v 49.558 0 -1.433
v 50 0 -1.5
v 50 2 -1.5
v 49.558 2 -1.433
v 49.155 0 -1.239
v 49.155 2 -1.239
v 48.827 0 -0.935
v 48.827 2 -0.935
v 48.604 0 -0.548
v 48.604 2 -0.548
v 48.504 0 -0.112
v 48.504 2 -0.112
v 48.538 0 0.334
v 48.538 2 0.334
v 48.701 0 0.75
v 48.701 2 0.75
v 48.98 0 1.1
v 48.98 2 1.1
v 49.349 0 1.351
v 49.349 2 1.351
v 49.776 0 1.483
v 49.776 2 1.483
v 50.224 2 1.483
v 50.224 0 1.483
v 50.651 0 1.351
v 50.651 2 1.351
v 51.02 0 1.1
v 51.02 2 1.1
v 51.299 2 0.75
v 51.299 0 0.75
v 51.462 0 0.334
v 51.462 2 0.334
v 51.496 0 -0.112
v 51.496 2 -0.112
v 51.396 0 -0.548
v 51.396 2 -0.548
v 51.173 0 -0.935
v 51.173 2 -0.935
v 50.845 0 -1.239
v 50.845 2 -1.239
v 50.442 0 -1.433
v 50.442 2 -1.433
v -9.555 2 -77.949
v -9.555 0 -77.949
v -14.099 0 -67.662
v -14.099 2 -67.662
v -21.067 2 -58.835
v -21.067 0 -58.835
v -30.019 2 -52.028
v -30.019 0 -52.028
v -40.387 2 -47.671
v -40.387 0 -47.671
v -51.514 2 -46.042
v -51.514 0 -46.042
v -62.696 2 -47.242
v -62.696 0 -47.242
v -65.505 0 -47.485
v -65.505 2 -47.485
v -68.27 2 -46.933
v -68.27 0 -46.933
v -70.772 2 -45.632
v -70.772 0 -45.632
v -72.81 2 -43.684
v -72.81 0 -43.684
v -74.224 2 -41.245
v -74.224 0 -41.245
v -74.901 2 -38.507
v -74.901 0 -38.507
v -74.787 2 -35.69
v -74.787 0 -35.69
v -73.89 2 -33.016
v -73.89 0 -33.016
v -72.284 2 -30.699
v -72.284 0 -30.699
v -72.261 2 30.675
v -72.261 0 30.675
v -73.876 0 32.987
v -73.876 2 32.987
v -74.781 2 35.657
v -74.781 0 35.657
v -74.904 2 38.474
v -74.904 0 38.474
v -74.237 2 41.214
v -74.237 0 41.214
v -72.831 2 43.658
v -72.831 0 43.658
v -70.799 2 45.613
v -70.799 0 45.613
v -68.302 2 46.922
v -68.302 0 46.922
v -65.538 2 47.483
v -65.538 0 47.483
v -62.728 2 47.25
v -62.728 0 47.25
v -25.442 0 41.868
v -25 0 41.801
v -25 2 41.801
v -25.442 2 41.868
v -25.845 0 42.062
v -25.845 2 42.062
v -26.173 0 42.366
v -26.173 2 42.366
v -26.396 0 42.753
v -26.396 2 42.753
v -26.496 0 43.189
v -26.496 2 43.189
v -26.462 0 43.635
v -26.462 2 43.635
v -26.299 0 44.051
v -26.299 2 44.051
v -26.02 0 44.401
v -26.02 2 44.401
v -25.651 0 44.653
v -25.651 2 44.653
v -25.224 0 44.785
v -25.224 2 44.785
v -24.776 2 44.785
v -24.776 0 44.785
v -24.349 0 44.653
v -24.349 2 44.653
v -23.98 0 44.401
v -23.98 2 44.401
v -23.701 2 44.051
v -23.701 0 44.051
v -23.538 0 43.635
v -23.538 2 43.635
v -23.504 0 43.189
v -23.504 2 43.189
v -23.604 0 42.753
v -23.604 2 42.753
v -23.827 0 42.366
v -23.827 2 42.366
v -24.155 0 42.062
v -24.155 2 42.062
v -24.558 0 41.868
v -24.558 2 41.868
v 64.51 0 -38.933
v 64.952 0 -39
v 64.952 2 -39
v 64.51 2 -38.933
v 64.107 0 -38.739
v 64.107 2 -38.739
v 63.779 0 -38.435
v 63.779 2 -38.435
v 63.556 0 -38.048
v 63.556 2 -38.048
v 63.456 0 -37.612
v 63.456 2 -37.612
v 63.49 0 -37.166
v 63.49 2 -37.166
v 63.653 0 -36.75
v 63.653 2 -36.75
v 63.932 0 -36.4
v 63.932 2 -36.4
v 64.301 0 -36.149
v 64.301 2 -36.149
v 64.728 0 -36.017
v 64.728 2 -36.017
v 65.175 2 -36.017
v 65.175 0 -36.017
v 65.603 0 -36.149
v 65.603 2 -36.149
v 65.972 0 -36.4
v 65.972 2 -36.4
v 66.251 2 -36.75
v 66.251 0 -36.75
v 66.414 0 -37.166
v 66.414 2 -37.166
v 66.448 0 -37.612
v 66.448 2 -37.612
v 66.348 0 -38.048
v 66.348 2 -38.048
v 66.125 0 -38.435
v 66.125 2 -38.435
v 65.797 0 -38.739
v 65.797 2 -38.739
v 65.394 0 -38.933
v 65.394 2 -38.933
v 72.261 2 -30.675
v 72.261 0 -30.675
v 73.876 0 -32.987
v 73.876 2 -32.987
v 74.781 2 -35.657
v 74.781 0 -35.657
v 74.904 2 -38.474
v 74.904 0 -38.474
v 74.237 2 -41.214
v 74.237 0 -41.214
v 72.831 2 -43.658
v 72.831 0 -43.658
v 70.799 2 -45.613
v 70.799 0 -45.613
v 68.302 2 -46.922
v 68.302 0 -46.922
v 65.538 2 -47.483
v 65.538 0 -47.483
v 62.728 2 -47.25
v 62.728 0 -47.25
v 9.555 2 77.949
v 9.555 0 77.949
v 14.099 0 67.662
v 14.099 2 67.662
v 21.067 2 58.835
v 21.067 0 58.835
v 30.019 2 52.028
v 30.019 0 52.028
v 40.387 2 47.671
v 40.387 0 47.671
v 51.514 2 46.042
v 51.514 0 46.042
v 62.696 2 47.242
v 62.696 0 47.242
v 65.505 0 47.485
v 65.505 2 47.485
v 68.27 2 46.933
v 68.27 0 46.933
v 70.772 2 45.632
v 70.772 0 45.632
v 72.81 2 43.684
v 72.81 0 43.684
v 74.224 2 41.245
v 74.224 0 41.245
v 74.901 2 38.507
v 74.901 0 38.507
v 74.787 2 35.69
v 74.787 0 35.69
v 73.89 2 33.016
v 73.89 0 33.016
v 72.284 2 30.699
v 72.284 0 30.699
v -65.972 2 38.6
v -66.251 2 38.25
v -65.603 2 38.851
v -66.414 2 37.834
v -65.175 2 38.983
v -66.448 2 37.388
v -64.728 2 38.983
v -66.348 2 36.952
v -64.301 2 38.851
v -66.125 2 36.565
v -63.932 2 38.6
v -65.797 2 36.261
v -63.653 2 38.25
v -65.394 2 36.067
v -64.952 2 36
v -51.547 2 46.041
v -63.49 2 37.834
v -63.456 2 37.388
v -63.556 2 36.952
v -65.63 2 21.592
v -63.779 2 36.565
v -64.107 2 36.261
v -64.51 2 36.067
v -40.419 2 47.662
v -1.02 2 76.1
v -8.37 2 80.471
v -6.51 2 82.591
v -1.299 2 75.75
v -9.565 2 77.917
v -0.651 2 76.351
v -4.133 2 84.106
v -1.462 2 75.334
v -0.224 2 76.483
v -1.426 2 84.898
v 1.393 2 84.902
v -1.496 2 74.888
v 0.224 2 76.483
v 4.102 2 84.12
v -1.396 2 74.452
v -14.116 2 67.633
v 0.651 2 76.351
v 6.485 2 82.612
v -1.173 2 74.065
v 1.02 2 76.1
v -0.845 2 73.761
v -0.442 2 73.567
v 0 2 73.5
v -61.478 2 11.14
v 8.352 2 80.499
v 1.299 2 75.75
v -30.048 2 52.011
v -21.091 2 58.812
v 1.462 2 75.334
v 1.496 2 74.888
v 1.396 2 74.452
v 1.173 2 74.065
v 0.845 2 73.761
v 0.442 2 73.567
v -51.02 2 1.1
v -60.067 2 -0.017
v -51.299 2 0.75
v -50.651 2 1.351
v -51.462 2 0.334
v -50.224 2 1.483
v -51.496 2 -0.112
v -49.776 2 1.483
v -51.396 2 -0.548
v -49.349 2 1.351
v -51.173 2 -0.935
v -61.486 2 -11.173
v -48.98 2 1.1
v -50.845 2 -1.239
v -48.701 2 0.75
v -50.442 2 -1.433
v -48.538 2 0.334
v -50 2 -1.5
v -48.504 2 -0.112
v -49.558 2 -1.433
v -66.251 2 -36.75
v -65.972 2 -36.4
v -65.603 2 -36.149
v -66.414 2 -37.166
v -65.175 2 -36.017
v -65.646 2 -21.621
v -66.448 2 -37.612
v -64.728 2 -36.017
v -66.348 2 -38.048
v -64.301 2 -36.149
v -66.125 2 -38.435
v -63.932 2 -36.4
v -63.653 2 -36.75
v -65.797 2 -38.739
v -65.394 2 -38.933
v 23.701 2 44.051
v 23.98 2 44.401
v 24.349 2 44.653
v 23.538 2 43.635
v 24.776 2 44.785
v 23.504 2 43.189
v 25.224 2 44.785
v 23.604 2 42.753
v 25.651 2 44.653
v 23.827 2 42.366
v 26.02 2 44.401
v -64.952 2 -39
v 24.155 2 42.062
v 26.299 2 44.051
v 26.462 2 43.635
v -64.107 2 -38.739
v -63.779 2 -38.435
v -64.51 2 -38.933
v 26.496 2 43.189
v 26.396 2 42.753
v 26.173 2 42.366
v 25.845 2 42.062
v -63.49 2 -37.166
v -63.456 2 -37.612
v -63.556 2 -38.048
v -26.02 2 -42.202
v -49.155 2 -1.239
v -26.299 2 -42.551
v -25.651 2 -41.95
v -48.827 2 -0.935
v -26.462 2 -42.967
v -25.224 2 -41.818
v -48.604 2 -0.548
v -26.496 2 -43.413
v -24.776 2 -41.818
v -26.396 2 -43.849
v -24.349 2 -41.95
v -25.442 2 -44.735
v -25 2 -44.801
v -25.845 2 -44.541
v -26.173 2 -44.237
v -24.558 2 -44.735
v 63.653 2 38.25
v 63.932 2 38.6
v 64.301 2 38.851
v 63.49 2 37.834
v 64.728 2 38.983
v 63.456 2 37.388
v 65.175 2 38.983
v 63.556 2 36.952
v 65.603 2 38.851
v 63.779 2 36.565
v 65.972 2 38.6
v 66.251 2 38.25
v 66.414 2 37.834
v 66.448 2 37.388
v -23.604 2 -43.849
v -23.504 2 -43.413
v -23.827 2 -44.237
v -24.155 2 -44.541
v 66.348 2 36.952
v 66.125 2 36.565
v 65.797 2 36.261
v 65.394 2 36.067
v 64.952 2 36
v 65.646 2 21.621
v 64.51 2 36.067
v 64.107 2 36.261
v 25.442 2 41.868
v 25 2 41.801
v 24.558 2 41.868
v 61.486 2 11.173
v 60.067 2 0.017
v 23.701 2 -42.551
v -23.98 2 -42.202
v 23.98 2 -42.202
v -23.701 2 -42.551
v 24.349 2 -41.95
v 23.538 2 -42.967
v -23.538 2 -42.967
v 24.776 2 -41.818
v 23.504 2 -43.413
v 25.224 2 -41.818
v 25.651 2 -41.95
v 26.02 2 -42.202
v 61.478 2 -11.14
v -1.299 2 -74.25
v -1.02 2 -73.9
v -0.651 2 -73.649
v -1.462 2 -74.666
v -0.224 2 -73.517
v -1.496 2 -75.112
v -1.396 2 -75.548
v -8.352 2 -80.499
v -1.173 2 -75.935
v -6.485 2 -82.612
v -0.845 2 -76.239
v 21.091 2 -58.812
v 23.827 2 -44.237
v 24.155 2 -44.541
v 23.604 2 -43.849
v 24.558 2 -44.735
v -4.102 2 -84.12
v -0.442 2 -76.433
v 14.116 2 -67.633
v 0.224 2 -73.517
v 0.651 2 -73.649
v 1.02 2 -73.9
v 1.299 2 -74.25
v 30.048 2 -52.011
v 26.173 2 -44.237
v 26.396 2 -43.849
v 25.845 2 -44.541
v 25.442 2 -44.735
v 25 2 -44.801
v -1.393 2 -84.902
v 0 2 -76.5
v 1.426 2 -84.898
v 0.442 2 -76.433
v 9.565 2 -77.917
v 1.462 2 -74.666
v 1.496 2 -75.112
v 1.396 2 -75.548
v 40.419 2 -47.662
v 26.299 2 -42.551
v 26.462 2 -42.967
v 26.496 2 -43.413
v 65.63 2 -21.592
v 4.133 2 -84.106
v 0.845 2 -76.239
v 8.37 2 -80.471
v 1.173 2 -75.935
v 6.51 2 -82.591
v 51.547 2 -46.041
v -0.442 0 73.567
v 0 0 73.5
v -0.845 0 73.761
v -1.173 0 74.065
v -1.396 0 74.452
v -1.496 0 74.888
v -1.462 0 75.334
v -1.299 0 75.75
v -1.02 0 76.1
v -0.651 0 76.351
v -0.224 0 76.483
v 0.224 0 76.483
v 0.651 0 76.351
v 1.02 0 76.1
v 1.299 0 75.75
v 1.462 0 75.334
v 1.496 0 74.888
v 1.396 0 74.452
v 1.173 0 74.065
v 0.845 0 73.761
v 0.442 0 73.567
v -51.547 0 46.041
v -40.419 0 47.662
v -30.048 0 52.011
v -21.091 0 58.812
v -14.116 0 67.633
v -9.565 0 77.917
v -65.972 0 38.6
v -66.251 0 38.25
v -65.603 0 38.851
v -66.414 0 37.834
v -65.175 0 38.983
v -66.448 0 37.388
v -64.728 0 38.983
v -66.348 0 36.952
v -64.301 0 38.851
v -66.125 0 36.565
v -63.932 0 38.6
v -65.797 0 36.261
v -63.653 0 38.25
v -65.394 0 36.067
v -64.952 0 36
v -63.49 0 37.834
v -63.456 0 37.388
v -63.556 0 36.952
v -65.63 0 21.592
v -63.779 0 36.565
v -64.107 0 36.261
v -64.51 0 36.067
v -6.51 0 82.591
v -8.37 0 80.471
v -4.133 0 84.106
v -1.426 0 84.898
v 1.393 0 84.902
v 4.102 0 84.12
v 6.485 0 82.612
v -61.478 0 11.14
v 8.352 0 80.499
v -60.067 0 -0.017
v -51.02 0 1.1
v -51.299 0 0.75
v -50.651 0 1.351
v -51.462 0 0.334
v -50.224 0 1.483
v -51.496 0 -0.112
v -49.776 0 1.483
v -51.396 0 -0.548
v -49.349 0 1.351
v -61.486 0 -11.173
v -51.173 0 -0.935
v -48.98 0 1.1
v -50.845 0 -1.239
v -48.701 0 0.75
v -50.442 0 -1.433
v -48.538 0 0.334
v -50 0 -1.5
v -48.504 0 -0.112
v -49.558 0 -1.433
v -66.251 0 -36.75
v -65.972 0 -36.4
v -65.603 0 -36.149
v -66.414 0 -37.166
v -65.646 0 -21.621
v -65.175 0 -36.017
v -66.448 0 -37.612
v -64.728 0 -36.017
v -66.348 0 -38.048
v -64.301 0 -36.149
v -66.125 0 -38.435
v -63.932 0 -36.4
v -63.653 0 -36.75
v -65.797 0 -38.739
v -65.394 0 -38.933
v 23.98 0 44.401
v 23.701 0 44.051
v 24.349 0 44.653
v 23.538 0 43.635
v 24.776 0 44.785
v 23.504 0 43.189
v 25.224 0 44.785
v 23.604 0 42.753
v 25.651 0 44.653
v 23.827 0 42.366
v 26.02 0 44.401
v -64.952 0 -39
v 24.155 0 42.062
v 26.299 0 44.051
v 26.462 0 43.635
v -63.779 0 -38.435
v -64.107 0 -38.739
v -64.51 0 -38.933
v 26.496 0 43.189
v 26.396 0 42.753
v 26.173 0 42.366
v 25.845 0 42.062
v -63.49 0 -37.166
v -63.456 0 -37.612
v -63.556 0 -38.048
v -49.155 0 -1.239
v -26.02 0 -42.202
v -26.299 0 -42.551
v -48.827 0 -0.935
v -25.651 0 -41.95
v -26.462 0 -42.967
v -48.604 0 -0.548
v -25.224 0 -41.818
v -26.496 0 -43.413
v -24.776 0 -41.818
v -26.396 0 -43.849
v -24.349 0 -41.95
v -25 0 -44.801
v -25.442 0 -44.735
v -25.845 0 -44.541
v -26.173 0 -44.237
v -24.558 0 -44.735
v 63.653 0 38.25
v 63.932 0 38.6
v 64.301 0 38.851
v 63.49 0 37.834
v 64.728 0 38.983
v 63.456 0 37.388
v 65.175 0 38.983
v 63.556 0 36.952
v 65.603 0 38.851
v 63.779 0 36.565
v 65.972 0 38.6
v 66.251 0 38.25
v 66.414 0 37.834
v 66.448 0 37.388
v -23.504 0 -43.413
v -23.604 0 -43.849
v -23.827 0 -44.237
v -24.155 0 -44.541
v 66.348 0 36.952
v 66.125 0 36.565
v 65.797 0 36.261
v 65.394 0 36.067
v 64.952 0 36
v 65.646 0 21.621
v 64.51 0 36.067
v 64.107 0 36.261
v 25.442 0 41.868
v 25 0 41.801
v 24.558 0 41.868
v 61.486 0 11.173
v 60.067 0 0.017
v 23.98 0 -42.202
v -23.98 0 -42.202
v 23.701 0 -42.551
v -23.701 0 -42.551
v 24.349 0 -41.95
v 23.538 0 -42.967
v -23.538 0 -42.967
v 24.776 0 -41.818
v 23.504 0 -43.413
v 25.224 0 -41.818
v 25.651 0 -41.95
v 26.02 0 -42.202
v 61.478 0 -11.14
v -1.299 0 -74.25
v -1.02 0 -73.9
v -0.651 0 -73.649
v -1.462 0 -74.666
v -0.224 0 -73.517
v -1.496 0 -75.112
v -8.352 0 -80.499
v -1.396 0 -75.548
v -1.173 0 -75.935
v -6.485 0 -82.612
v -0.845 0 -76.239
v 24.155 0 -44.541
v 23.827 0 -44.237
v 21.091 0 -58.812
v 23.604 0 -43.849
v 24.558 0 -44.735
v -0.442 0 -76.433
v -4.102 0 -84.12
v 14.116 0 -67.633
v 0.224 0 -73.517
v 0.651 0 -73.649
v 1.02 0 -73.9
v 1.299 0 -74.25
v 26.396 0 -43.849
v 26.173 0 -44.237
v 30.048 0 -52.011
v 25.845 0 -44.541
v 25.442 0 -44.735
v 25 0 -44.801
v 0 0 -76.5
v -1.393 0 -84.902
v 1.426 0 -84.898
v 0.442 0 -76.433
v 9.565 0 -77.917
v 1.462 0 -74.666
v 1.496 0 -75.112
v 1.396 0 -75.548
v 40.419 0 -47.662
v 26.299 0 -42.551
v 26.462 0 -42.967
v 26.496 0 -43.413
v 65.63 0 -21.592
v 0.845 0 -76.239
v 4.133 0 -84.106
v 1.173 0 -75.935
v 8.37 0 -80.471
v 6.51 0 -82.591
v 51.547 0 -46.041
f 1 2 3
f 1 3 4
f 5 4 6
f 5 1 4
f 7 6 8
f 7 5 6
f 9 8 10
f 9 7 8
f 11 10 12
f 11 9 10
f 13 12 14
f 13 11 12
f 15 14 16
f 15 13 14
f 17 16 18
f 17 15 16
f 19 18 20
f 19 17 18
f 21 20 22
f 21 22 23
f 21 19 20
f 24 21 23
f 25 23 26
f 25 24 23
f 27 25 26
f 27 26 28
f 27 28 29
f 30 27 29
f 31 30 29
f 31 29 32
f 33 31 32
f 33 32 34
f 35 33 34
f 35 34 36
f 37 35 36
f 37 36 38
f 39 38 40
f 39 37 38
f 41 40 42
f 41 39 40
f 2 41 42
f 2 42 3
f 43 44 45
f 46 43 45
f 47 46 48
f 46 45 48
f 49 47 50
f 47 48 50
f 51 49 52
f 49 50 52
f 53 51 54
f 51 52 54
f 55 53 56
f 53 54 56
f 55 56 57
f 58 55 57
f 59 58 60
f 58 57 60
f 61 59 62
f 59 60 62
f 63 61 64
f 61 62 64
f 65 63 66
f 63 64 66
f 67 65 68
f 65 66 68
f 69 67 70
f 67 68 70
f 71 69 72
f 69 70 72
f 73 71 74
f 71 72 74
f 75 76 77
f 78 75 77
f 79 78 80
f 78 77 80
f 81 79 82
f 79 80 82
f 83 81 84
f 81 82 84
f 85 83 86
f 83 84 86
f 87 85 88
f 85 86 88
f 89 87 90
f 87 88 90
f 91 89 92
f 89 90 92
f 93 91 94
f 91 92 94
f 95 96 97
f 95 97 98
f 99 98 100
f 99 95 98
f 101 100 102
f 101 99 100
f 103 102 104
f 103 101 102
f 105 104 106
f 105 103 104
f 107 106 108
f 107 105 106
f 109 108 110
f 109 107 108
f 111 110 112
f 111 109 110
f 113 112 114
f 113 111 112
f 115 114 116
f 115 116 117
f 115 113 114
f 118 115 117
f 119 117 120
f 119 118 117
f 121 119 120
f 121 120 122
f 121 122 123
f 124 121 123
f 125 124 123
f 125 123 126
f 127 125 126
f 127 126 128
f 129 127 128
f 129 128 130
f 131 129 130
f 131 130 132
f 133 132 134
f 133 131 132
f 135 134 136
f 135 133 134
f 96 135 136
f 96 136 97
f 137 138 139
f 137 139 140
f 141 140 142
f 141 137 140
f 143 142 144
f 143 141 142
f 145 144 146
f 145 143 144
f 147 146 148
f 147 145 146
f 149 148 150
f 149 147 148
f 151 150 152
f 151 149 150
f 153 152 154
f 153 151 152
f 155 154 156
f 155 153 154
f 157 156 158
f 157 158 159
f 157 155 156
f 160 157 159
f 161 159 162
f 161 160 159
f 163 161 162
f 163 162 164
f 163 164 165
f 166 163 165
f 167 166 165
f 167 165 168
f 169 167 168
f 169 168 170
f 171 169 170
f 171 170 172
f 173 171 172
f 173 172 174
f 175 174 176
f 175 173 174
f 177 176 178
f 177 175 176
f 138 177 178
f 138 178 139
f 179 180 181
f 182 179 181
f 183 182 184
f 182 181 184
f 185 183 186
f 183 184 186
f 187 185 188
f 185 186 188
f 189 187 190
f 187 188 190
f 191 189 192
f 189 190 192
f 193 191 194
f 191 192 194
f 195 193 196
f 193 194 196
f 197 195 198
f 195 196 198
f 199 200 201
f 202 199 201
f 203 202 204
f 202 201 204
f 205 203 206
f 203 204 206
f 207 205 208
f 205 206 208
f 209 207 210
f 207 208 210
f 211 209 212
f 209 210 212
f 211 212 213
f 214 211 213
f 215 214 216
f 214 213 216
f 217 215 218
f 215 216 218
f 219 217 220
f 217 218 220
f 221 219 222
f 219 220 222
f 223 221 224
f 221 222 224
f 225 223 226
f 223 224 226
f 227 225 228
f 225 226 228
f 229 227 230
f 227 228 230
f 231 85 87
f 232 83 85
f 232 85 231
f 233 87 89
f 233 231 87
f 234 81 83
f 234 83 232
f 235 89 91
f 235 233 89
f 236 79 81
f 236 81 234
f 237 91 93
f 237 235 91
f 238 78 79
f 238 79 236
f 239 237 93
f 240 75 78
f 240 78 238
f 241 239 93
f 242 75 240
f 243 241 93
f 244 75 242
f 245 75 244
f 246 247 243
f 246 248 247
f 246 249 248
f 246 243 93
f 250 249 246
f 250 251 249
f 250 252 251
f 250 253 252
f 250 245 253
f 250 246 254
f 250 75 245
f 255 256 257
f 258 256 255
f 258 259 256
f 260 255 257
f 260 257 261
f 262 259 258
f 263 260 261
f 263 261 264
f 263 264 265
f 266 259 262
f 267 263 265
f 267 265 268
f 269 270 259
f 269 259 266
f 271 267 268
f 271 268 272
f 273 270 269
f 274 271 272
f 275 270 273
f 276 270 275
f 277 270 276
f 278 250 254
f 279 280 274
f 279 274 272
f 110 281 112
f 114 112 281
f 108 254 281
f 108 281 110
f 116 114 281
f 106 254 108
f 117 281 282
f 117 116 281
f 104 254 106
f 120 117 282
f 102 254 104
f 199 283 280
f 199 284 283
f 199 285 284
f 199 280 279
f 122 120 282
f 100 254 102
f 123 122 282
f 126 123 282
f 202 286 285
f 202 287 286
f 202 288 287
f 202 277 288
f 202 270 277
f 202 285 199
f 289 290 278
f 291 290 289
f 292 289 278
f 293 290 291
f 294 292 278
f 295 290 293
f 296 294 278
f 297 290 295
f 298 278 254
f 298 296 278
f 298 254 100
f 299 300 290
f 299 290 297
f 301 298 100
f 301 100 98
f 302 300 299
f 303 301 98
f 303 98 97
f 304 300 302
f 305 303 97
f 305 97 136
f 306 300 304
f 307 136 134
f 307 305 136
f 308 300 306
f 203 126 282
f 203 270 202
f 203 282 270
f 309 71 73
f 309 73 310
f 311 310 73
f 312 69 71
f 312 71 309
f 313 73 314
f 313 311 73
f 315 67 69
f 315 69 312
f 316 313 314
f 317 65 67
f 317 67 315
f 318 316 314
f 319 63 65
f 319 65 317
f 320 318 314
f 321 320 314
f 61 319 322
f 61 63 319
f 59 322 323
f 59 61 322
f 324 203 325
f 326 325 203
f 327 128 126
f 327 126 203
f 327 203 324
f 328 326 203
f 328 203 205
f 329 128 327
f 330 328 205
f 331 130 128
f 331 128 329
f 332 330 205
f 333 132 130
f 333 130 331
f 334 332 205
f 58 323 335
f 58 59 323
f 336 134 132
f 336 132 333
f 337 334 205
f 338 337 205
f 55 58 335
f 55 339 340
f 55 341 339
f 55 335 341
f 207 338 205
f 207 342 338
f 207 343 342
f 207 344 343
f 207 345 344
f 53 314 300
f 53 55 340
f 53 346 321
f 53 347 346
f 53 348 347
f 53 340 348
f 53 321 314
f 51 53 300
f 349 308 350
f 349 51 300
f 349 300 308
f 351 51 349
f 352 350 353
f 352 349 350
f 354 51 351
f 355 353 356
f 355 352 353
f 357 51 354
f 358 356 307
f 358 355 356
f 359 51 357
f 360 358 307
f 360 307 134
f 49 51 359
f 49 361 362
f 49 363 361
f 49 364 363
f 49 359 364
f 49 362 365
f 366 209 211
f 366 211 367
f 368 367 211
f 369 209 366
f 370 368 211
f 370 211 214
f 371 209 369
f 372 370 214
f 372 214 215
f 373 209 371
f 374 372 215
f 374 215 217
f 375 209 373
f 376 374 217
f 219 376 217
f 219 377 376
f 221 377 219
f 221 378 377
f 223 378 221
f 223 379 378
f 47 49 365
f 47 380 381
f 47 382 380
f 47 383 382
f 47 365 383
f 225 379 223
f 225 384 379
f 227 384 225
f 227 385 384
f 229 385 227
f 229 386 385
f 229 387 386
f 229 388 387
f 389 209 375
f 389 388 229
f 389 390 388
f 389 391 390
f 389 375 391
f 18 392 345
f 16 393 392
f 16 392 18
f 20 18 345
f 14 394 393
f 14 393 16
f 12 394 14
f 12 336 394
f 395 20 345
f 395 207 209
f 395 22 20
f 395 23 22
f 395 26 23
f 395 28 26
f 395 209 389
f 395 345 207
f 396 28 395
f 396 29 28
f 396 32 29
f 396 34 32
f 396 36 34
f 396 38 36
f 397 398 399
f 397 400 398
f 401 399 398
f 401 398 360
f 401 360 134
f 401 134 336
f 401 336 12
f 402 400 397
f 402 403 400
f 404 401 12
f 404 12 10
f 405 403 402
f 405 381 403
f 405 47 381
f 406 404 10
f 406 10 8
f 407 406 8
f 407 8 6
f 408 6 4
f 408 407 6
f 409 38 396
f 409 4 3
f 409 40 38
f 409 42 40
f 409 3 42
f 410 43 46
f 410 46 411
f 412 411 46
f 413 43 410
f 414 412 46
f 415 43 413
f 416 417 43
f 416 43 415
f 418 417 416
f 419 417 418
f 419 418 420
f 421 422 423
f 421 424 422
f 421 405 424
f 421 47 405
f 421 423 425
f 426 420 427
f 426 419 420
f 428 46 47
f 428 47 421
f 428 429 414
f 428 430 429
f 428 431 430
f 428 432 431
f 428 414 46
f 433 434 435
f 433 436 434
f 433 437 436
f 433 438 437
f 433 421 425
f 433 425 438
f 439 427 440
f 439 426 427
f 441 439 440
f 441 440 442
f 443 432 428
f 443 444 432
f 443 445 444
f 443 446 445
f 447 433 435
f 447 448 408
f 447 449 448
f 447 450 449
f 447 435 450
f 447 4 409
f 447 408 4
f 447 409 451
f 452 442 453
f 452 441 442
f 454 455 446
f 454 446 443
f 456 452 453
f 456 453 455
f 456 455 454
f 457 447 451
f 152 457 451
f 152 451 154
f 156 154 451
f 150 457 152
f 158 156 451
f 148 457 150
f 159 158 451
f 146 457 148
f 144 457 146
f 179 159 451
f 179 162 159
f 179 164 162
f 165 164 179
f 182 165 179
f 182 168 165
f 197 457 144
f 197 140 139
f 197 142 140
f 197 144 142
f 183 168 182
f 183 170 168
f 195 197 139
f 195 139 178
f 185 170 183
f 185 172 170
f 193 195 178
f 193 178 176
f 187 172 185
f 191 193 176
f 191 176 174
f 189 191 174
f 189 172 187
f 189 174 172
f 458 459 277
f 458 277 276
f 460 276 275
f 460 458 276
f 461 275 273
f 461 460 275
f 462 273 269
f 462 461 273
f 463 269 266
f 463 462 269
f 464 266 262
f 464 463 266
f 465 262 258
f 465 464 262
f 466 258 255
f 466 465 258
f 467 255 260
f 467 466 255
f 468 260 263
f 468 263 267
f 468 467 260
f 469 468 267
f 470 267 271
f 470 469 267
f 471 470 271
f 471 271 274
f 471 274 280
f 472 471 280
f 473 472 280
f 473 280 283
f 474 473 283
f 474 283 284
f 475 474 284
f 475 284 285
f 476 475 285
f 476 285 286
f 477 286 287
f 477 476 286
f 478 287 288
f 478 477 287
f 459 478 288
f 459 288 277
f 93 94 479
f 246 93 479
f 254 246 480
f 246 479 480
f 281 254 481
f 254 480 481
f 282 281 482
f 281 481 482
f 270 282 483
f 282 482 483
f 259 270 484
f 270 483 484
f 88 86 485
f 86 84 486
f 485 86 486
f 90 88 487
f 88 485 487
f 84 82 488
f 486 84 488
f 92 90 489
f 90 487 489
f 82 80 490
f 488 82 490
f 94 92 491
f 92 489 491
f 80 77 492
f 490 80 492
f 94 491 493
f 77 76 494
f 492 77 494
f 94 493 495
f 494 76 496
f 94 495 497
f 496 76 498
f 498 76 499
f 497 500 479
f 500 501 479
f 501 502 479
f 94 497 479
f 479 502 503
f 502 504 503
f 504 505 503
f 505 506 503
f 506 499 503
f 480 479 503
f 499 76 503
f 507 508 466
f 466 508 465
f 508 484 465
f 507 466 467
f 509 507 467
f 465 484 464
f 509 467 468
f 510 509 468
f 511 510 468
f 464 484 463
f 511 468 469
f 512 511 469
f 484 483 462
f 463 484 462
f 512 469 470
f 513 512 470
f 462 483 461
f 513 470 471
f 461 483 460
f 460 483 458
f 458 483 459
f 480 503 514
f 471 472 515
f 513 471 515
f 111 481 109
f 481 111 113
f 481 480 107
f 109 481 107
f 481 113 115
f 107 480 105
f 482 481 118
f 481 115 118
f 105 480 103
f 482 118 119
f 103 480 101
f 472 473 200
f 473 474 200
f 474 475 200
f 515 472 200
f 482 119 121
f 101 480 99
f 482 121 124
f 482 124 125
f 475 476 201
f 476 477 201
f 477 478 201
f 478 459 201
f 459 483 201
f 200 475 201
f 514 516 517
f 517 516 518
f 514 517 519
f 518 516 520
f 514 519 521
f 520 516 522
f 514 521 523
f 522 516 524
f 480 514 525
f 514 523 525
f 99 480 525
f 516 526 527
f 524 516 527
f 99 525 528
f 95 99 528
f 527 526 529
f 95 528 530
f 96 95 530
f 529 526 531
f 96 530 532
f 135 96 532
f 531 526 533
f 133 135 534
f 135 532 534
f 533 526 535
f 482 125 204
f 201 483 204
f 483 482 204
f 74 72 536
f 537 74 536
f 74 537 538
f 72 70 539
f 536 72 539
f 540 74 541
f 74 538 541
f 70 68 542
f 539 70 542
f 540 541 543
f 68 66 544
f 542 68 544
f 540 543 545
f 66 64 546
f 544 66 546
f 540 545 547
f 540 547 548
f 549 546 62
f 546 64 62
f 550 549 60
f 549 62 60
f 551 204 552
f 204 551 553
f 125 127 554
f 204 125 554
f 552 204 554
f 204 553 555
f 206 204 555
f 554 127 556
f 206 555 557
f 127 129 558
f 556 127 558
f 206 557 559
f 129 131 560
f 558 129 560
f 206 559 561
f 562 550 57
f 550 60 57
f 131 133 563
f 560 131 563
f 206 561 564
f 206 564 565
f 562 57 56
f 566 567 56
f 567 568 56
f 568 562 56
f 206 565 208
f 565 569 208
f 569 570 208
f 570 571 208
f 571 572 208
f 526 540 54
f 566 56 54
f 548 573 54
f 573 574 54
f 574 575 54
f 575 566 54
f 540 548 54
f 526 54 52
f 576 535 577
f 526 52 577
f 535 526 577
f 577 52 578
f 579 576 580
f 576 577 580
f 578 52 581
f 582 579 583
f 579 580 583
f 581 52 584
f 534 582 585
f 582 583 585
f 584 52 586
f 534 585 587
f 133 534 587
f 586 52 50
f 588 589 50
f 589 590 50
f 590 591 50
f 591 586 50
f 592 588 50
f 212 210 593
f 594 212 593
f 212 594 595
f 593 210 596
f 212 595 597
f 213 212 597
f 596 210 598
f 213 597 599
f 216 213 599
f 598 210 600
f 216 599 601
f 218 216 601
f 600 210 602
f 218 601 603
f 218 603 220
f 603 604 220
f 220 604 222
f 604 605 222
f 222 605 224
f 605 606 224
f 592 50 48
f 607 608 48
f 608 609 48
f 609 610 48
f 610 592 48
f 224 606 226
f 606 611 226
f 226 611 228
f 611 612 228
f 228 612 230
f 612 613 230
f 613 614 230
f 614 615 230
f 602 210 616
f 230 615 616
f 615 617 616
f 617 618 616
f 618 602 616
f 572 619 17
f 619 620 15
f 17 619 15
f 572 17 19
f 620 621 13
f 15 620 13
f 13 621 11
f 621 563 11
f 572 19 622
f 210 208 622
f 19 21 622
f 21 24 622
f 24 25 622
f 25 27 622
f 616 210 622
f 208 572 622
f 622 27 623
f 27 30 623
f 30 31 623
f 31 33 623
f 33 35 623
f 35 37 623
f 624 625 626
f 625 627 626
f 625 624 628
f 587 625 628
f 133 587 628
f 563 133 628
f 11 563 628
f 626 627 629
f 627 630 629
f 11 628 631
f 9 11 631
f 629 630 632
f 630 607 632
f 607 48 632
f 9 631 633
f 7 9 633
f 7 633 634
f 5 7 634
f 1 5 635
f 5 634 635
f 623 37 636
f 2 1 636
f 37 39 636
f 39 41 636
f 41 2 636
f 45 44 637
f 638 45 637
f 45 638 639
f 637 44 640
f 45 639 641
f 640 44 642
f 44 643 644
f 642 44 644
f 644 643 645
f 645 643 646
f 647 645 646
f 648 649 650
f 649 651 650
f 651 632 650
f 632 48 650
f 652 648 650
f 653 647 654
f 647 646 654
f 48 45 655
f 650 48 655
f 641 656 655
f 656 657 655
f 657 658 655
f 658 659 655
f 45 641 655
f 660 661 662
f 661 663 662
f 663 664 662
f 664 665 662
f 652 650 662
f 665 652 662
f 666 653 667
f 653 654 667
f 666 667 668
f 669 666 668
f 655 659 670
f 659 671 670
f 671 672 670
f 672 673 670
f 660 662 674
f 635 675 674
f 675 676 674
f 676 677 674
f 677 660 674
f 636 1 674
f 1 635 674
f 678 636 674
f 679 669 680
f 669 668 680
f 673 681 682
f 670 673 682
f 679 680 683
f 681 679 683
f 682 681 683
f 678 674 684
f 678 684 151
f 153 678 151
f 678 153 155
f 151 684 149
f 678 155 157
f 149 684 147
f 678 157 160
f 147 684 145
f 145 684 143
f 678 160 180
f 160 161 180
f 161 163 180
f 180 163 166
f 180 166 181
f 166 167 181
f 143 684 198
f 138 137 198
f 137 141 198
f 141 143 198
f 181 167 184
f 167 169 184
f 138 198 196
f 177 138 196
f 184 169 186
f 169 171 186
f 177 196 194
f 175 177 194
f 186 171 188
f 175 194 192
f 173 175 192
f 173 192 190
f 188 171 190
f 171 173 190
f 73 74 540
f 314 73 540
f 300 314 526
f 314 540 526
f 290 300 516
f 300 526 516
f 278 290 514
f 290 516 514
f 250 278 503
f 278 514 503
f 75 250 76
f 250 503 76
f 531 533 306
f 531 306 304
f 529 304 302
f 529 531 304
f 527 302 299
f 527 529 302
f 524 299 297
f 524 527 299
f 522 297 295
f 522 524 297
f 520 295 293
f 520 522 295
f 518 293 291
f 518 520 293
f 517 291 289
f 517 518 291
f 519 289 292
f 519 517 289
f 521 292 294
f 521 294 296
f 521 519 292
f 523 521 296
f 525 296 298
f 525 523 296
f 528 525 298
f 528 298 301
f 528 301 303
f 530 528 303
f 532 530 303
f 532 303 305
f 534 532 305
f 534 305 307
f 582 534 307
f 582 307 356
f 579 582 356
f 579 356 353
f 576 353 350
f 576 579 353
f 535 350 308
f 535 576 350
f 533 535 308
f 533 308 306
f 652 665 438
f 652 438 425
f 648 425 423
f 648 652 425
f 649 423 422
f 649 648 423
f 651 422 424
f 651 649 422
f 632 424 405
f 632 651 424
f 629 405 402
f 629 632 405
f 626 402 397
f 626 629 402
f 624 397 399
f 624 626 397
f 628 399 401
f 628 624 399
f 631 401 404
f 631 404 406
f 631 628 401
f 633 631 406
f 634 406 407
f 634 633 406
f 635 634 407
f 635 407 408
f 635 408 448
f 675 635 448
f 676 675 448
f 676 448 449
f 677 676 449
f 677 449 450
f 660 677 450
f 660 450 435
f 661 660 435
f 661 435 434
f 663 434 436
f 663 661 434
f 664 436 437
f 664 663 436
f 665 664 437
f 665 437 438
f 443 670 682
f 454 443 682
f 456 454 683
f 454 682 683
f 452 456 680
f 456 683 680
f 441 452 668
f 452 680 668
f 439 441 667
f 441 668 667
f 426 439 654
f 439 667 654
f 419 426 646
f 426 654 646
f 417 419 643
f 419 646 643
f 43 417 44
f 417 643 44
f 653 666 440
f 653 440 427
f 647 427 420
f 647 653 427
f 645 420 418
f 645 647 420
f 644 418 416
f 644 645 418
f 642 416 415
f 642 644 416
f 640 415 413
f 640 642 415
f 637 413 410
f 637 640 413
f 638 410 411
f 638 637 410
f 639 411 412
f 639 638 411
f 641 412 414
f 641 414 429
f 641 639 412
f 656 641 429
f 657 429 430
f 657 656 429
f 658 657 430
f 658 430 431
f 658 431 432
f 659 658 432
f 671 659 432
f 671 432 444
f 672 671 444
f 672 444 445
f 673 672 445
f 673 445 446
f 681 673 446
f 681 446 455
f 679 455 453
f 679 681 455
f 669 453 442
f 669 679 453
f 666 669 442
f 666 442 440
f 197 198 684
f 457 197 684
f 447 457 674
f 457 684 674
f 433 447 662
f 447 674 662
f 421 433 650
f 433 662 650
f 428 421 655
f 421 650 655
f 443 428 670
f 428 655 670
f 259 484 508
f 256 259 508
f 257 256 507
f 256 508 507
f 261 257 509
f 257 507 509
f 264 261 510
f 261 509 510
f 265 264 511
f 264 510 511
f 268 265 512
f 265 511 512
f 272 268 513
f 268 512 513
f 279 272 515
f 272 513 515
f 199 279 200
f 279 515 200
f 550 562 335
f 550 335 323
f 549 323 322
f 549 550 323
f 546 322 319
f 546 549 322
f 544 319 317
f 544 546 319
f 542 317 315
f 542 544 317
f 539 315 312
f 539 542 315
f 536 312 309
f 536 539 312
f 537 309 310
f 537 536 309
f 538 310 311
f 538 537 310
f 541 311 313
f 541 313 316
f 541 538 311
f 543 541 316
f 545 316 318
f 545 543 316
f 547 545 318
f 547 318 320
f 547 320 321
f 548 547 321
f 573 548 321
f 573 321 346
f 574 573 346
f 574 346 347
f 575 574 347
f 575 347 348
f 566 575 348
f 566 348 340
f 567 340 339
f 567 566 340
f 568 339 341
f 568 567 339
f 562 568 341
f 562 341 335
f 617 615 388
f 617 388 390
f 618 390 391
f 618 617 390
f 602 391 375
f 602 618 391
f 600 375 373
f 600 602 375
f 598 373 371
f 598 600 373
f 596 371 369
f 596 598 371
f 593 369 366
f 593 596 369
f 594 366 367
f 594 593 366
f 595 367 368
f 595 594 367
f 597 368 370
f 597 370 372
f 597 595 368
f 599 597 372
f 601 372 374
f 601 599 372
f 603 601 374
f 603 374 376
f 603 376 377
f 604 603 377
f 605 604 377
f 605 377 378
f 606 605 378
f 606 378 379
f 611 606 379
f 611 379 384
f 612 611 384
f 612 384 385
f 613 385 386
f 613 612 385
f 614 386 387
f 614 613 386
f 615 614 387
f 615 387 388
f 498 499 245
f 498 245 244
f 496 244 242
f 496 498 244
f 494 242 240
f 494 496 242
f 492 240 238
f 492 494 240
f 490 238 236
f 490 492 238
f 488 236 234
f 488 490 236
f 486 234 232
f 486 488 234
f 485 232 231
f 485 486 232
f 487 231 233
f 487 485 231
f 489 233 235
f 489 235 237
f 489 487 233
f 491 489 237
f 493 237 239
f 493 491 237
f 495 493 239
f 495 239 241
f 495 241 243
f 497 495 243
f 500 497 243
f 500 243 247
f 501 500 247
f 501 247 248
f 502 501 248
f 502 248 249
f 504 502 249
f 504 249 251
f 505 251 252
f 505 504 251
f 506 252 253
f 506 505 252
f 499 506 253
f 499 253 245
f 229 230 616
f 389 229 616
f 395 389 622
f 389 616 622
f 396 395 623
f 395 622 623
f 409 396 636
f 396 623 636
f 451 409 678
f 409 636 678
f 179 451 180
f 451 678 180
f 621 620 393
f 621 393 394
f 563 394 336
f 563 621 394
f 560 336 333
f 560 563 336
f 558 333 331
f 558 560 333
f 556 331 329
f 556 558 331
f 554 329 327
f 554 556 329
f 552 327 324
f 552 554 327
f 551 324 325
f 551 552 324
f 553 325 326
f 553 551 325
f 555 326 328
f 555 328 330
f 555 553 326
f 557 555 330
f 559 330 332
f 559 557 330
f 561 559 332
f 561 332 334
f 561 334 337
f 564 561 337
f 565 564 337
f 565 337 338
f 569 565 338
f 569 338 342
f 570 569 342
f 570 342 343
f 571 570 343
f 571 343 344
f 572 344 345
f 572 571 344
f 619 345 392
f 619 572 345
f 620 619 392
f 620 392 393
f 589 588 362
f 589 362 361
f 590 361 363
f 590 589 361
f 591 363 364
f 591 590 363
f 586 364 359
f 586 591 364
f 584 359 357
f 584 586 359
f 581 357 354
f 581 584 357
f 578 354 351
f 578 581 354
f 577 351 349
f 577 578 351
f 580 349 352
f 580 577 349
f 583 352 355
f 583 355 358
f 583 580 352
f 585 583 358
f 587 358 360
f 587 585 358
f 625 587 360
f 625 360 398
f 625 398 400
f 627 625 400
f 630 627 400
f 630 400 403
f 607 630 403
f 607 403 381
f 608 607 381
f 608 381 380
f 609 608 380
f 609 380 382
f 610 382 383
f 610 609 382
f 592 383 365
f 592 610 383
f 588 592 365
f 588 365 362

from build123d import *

# Parameters (mm, degrees)
SKETCH1_R           = 1.5
BOSS_EXTRUDE1_DEPTH = 2


with BuildPart() as part:
    # Sketch1 → Boss-Extrude1 (new body)
    with BuildSketch(Plane(origin=(0, 0, 0), x_dir=(1, 0, 0), z_dir=(0, 1, 0))):
        with BuildLine():
            ThreePointArc((9.564996236, 77.917335601), (0.016639307, 84.999986157), (-9.555234796, 77.949150385))
            ThreePointArc((-9.555234796, 77.949150385), (-30.018823636, 52.027506279), (-62.695893908, 47.242197528))
            ThreePointArc((-62.695893908, 47.242197528), (-73.603827679, 42.514403141), (-72.283561835, 30.69949912))
            ThreePointArc((-72.283561835, 30.69949912), (-60.066553951, 0.016689279), (-72.260890144, -30.675138073))
            ThreePointArc((-72.260890144, -30.675138073), (-73.620466987, -42.485583015), (-62.728327039, -47.249651265))
            ThreePointArc((-62.728327039, -47.249651265), (-30.047730315, -52.010817), (-9.564996236, -77.917335601))
            ThreePointArc((-9.564996236, -77.917335601), (-0.016639307, -84.999986157), (9.555234796, -77.949150385))
            ThreePointArc((9.555234796, -77.949150385), (30.018823636, -52.027506279), (62.695893908, -47.242197528))
            ThreePointArc((62.695893908, -47.242197528), (73.603827679, -42.514403141), (72.283561835, -30.69949912))
            ThreePointArc((72.283561835, -30.69949912), (60.066553951, -0.016689279), (72.260890144, 30.675138073))
            ThreePointArc((72.260890144, 30.675138073), (73.620466987, 42.485583015), (62.728327039, 47.249651265))
            ThreePointArc((62.728327039, 47.249651265), (30.047730315, 52.010817), (9.564996236, 77.917335601))
        make_face()
        with Locations(Location((-64.951905284, -37.5, 0), (0, 0, 90))):
            Circle(SKETCH1_R, mode=Mode.SUBTRACT)
        with Locations(Location((0, 75, 0), (0, 0, 90))):
            Circle(SKETCH1_R, mode=Mode.SUBTRACT)
        with Locations(Location((-25, 43.301270189, 0), (0, 0, 90))):
            Circle(SKETCH1_R, mode=Mode.SUBTRACT)
        with Locations(Location((-64.951905284, 37.5, 0), (0, 0, 90))):
            Circle(SKETCH1_R, mode=Mode.SUBTRACT)
        with Locations(Location((64.951905284, 37.5, 0), (0, 0, 90))):
            Circle(SKETCH1_R, mode=Mode.SUBTRACT)
        with Locations(Location((64.951905284, -37.5, 0), (0, 0, 90))):
            Circle(SKETCH1_R, mode=Mode.SUBTRACT)
        with Locations(Location((25, 43.301270189, 0), (0, 0, 90))):
            Circle(SKETCH1_R, mode=Mode.SUBTRACT)
        with Locations(Location((0, -75, 0), (0, 0, 90))):
            Circle(SKETCH1_R, mode=Mode.SUBTRACT)
        with Locations(Location((-50, 0, 0), (0, 0, 90))):
            Circle(SKETCH1_R, mode=Mode.SUBTRACT)
        with Locations(Location((25, -43.301270189, 0), (0, 0, 90))):
            Circle(SKETCH1_R, mode=Mode.SUBTRACT)
        with Locations(Location((-25, -43.301270189, 0), (0, 0, 90))):
            Circle(SKETCH1_R, mode=Mode.SUBTRACT)
        with Locations(Location((50, 0, 0), (0, 0, 90))):
            Circle(SKETCH1_R, mode=Mode.SUBTRACT)
    extrude(amount=BOSS_EXTRUDE1_DEPTH)


solid = part.part
